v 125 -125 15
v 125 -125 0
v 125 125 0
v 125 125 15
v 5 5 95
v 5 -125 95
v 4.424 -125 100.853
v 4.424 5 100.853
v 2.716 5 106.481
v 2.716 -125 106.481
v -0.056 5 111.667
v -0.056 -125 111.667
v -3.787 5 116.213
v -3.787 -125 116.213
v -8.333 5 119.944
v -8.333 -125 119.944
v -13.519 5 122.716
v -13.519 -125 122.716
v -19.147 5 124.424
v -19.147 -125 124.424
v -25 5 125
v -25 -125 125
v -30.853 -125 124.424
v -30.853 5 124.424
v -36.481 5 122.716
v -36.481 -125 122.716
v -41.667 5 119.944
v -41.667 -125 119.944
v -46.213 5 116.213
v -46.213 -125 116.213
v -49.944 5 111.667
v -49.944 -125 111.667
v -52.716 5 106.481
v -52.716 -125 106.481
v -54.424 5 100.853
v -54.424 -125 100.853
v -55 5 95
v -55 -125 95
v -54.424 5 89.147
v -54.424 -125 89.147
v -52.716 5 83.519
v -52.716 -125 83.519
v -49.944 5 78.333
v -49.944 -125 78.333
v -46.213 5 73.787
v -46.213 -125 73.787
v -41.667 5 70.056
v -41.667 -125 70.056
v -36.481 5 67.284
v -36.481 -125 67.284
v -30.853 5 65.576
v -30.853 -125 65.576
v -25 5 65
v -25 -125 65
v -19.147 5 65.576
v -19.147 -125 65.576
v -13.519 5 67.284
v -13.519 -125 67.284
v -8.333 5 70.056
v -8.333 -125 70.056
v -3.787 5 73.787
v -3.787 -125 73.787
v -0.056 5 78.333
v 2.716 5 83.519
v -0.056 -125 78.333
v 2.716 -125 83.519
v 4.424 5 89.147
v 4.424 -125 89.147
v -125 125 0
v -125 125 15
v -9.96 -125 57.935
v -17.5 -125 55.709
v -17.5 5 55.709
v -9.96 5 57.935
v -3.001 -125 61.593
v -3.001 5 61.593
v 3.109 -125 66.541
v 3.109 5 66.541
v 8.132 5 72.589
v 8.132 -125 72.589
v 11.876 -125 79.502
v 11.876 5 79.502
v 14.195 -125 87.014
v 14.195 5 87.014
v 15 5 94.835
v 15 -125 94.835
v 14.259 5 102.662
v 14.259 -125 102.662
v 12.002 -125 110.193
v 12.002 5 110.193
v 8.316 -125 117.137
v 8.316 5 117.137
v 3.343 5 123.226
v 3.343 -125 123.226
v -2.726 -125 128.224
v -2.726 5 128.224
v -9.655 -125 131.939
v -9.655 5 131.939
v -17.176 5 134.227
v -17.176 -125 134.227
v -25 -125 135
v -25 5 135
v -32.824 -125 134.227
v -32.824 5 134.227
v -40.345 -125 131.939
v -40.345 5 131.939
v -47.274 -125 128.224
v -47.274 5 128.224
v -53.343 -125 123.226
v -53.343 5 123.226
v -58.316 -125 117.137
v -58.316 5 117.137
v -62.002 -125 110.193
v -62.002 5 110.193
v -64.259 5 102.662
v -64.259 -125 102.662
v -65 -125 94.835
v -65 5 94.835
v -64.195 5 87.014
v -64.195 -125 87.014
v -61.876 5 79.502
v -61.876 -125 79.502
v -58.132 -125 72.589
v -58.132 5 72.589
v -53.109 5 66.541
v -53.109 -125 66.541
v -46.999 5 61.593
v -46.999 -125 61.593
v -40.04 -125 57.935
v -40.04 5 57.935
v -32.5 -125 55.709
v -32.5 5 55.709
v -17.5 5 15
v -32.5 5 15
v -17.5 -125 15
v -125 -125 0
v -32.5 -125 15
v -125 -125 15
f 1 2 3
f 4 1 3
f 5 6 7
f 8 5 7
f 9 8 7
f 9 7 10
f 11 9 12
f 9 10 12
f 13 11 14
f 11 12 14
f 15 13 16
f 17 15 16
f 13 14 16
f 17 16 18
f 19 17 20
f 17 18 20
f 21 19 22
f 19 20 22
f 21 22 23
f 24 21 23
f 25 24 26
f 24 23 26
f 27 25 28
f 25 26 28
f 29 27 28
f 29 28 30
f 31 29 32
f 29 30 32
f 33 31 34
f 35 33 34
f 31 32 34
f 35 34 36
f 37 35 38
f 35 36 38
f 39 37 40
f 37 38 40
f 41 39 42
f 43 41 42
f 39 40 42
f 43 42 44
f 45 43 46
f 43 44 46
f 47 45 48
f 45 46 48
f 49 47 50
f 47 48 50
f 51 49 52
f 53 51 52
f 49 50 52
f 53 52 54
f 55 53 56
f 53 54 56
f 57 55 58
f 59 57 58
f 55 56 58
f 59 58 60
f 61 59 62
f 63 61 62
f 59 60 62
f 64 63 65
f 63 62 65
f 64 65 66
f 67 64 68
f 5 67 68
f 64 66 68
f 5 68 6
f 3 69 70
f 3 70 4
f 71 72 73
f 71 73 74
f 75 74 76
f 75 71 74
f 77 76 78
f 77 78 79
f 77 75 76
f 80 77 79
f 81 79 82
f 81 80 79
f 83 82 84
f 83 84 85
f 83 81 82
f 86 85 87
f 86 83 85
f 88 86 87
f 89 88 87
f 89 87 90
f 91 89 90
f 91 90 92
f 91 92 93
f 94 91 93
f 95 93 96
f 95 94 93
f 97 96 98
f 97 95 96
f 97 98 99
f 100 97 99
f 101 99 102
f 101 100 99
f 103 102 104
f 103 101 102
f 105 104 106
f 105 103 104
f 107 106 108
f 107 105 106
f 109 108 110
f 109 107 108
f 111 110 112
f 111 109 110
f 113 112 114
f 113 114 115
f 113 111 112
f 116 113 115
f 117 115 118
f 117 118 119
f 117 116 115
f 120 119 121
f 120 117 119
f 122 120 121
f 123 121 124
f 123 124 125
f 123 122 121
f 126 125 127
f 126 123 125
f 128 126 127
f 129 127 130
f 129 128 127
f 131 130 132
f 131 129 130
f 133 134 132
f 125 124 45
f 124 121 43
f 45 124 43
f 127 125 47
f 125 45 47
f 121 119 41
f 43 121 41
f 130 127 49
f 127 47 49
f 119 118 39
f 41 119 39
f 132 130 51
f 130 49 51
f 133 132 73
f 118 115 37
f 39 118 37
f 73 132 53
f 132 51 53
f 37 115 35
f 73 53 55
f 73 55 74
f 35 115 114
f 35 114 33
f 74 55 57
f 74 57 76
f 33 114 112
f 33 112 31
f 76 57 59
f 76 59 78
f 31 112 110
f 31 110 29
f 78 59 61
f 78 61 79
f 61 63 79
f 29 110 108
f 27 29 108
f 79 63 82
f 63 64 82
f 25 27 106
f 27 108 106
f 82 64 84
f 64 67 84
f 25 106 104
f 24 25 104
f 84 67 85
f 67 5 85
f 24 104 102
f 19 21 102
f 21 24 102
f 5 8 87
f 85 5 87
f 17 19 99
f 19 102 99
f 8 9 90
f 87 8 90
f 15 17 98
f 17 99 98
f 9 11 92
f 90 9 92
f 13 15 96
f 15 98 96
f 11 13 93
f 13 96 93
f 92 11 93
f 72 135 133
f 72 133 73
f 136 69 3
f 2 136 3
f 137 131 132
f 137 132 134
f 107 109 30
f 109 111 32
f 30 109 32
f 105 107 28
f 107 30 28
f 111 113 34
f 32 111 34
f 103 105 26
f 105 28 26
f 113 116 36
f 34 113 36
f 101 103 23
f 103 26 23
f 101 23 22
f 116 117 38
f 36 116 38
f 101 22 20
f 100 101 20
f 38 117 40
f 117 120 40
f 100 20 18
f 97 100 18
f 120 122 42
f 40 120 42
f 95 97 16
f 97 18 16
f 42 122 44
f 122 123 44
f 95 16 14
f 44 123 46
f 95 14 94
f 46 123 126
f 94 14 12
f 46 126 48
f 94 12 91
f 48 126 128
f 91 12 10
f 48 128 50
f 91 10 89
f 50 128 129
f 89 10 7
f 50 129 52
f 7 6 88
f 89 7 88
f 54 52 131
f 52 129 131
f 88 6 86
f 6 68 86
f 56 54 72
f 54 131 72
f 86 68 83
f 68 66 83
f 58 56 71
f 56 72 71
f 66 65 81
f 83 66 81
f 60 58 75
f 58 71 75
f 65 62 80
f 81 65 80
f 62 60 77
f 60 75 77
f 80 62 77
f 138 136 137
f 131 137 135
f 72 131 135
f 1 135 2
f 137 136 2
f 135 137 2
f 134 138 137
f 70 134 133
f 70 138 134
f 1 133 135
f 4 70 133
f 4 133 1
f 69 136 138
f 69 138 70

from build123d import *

# Parameters (mm, degrees)
F0_W     = 250
F0_H     = 250
F1_DEPTH = 15
F2_R     = 30
F3_DEPTH = 130


with BuildPart() as f1:
    # F0 (on Top) → F1 (new body)
    with BuildSketch(Plane.XY):
        Rectangle(F0_W, F0_H)
    extrude(amount=F1_DEPTH)

    # F2 (on face) → F3 (join)
    with BuildSketch(Plane.XZ.offset(125)):
        with BuildLine():
            Line((-17.5, 15), (-17.5, 55.709416))
            ThreePointArc((-17.5, 55.709416), (-25, 135), (-32.5, 55.709416))
            Line((-32.5, 55.709416), (-32.5, 15))
            Line((-32.5, 15), (-17.5, 15))
        make_face()
        with Locations((-25, 95)):
            Circle(F2_R, mode=Mode.SUBTRACT)
    extrude(amount=-F3_DEPTH)


solid = f1.part
